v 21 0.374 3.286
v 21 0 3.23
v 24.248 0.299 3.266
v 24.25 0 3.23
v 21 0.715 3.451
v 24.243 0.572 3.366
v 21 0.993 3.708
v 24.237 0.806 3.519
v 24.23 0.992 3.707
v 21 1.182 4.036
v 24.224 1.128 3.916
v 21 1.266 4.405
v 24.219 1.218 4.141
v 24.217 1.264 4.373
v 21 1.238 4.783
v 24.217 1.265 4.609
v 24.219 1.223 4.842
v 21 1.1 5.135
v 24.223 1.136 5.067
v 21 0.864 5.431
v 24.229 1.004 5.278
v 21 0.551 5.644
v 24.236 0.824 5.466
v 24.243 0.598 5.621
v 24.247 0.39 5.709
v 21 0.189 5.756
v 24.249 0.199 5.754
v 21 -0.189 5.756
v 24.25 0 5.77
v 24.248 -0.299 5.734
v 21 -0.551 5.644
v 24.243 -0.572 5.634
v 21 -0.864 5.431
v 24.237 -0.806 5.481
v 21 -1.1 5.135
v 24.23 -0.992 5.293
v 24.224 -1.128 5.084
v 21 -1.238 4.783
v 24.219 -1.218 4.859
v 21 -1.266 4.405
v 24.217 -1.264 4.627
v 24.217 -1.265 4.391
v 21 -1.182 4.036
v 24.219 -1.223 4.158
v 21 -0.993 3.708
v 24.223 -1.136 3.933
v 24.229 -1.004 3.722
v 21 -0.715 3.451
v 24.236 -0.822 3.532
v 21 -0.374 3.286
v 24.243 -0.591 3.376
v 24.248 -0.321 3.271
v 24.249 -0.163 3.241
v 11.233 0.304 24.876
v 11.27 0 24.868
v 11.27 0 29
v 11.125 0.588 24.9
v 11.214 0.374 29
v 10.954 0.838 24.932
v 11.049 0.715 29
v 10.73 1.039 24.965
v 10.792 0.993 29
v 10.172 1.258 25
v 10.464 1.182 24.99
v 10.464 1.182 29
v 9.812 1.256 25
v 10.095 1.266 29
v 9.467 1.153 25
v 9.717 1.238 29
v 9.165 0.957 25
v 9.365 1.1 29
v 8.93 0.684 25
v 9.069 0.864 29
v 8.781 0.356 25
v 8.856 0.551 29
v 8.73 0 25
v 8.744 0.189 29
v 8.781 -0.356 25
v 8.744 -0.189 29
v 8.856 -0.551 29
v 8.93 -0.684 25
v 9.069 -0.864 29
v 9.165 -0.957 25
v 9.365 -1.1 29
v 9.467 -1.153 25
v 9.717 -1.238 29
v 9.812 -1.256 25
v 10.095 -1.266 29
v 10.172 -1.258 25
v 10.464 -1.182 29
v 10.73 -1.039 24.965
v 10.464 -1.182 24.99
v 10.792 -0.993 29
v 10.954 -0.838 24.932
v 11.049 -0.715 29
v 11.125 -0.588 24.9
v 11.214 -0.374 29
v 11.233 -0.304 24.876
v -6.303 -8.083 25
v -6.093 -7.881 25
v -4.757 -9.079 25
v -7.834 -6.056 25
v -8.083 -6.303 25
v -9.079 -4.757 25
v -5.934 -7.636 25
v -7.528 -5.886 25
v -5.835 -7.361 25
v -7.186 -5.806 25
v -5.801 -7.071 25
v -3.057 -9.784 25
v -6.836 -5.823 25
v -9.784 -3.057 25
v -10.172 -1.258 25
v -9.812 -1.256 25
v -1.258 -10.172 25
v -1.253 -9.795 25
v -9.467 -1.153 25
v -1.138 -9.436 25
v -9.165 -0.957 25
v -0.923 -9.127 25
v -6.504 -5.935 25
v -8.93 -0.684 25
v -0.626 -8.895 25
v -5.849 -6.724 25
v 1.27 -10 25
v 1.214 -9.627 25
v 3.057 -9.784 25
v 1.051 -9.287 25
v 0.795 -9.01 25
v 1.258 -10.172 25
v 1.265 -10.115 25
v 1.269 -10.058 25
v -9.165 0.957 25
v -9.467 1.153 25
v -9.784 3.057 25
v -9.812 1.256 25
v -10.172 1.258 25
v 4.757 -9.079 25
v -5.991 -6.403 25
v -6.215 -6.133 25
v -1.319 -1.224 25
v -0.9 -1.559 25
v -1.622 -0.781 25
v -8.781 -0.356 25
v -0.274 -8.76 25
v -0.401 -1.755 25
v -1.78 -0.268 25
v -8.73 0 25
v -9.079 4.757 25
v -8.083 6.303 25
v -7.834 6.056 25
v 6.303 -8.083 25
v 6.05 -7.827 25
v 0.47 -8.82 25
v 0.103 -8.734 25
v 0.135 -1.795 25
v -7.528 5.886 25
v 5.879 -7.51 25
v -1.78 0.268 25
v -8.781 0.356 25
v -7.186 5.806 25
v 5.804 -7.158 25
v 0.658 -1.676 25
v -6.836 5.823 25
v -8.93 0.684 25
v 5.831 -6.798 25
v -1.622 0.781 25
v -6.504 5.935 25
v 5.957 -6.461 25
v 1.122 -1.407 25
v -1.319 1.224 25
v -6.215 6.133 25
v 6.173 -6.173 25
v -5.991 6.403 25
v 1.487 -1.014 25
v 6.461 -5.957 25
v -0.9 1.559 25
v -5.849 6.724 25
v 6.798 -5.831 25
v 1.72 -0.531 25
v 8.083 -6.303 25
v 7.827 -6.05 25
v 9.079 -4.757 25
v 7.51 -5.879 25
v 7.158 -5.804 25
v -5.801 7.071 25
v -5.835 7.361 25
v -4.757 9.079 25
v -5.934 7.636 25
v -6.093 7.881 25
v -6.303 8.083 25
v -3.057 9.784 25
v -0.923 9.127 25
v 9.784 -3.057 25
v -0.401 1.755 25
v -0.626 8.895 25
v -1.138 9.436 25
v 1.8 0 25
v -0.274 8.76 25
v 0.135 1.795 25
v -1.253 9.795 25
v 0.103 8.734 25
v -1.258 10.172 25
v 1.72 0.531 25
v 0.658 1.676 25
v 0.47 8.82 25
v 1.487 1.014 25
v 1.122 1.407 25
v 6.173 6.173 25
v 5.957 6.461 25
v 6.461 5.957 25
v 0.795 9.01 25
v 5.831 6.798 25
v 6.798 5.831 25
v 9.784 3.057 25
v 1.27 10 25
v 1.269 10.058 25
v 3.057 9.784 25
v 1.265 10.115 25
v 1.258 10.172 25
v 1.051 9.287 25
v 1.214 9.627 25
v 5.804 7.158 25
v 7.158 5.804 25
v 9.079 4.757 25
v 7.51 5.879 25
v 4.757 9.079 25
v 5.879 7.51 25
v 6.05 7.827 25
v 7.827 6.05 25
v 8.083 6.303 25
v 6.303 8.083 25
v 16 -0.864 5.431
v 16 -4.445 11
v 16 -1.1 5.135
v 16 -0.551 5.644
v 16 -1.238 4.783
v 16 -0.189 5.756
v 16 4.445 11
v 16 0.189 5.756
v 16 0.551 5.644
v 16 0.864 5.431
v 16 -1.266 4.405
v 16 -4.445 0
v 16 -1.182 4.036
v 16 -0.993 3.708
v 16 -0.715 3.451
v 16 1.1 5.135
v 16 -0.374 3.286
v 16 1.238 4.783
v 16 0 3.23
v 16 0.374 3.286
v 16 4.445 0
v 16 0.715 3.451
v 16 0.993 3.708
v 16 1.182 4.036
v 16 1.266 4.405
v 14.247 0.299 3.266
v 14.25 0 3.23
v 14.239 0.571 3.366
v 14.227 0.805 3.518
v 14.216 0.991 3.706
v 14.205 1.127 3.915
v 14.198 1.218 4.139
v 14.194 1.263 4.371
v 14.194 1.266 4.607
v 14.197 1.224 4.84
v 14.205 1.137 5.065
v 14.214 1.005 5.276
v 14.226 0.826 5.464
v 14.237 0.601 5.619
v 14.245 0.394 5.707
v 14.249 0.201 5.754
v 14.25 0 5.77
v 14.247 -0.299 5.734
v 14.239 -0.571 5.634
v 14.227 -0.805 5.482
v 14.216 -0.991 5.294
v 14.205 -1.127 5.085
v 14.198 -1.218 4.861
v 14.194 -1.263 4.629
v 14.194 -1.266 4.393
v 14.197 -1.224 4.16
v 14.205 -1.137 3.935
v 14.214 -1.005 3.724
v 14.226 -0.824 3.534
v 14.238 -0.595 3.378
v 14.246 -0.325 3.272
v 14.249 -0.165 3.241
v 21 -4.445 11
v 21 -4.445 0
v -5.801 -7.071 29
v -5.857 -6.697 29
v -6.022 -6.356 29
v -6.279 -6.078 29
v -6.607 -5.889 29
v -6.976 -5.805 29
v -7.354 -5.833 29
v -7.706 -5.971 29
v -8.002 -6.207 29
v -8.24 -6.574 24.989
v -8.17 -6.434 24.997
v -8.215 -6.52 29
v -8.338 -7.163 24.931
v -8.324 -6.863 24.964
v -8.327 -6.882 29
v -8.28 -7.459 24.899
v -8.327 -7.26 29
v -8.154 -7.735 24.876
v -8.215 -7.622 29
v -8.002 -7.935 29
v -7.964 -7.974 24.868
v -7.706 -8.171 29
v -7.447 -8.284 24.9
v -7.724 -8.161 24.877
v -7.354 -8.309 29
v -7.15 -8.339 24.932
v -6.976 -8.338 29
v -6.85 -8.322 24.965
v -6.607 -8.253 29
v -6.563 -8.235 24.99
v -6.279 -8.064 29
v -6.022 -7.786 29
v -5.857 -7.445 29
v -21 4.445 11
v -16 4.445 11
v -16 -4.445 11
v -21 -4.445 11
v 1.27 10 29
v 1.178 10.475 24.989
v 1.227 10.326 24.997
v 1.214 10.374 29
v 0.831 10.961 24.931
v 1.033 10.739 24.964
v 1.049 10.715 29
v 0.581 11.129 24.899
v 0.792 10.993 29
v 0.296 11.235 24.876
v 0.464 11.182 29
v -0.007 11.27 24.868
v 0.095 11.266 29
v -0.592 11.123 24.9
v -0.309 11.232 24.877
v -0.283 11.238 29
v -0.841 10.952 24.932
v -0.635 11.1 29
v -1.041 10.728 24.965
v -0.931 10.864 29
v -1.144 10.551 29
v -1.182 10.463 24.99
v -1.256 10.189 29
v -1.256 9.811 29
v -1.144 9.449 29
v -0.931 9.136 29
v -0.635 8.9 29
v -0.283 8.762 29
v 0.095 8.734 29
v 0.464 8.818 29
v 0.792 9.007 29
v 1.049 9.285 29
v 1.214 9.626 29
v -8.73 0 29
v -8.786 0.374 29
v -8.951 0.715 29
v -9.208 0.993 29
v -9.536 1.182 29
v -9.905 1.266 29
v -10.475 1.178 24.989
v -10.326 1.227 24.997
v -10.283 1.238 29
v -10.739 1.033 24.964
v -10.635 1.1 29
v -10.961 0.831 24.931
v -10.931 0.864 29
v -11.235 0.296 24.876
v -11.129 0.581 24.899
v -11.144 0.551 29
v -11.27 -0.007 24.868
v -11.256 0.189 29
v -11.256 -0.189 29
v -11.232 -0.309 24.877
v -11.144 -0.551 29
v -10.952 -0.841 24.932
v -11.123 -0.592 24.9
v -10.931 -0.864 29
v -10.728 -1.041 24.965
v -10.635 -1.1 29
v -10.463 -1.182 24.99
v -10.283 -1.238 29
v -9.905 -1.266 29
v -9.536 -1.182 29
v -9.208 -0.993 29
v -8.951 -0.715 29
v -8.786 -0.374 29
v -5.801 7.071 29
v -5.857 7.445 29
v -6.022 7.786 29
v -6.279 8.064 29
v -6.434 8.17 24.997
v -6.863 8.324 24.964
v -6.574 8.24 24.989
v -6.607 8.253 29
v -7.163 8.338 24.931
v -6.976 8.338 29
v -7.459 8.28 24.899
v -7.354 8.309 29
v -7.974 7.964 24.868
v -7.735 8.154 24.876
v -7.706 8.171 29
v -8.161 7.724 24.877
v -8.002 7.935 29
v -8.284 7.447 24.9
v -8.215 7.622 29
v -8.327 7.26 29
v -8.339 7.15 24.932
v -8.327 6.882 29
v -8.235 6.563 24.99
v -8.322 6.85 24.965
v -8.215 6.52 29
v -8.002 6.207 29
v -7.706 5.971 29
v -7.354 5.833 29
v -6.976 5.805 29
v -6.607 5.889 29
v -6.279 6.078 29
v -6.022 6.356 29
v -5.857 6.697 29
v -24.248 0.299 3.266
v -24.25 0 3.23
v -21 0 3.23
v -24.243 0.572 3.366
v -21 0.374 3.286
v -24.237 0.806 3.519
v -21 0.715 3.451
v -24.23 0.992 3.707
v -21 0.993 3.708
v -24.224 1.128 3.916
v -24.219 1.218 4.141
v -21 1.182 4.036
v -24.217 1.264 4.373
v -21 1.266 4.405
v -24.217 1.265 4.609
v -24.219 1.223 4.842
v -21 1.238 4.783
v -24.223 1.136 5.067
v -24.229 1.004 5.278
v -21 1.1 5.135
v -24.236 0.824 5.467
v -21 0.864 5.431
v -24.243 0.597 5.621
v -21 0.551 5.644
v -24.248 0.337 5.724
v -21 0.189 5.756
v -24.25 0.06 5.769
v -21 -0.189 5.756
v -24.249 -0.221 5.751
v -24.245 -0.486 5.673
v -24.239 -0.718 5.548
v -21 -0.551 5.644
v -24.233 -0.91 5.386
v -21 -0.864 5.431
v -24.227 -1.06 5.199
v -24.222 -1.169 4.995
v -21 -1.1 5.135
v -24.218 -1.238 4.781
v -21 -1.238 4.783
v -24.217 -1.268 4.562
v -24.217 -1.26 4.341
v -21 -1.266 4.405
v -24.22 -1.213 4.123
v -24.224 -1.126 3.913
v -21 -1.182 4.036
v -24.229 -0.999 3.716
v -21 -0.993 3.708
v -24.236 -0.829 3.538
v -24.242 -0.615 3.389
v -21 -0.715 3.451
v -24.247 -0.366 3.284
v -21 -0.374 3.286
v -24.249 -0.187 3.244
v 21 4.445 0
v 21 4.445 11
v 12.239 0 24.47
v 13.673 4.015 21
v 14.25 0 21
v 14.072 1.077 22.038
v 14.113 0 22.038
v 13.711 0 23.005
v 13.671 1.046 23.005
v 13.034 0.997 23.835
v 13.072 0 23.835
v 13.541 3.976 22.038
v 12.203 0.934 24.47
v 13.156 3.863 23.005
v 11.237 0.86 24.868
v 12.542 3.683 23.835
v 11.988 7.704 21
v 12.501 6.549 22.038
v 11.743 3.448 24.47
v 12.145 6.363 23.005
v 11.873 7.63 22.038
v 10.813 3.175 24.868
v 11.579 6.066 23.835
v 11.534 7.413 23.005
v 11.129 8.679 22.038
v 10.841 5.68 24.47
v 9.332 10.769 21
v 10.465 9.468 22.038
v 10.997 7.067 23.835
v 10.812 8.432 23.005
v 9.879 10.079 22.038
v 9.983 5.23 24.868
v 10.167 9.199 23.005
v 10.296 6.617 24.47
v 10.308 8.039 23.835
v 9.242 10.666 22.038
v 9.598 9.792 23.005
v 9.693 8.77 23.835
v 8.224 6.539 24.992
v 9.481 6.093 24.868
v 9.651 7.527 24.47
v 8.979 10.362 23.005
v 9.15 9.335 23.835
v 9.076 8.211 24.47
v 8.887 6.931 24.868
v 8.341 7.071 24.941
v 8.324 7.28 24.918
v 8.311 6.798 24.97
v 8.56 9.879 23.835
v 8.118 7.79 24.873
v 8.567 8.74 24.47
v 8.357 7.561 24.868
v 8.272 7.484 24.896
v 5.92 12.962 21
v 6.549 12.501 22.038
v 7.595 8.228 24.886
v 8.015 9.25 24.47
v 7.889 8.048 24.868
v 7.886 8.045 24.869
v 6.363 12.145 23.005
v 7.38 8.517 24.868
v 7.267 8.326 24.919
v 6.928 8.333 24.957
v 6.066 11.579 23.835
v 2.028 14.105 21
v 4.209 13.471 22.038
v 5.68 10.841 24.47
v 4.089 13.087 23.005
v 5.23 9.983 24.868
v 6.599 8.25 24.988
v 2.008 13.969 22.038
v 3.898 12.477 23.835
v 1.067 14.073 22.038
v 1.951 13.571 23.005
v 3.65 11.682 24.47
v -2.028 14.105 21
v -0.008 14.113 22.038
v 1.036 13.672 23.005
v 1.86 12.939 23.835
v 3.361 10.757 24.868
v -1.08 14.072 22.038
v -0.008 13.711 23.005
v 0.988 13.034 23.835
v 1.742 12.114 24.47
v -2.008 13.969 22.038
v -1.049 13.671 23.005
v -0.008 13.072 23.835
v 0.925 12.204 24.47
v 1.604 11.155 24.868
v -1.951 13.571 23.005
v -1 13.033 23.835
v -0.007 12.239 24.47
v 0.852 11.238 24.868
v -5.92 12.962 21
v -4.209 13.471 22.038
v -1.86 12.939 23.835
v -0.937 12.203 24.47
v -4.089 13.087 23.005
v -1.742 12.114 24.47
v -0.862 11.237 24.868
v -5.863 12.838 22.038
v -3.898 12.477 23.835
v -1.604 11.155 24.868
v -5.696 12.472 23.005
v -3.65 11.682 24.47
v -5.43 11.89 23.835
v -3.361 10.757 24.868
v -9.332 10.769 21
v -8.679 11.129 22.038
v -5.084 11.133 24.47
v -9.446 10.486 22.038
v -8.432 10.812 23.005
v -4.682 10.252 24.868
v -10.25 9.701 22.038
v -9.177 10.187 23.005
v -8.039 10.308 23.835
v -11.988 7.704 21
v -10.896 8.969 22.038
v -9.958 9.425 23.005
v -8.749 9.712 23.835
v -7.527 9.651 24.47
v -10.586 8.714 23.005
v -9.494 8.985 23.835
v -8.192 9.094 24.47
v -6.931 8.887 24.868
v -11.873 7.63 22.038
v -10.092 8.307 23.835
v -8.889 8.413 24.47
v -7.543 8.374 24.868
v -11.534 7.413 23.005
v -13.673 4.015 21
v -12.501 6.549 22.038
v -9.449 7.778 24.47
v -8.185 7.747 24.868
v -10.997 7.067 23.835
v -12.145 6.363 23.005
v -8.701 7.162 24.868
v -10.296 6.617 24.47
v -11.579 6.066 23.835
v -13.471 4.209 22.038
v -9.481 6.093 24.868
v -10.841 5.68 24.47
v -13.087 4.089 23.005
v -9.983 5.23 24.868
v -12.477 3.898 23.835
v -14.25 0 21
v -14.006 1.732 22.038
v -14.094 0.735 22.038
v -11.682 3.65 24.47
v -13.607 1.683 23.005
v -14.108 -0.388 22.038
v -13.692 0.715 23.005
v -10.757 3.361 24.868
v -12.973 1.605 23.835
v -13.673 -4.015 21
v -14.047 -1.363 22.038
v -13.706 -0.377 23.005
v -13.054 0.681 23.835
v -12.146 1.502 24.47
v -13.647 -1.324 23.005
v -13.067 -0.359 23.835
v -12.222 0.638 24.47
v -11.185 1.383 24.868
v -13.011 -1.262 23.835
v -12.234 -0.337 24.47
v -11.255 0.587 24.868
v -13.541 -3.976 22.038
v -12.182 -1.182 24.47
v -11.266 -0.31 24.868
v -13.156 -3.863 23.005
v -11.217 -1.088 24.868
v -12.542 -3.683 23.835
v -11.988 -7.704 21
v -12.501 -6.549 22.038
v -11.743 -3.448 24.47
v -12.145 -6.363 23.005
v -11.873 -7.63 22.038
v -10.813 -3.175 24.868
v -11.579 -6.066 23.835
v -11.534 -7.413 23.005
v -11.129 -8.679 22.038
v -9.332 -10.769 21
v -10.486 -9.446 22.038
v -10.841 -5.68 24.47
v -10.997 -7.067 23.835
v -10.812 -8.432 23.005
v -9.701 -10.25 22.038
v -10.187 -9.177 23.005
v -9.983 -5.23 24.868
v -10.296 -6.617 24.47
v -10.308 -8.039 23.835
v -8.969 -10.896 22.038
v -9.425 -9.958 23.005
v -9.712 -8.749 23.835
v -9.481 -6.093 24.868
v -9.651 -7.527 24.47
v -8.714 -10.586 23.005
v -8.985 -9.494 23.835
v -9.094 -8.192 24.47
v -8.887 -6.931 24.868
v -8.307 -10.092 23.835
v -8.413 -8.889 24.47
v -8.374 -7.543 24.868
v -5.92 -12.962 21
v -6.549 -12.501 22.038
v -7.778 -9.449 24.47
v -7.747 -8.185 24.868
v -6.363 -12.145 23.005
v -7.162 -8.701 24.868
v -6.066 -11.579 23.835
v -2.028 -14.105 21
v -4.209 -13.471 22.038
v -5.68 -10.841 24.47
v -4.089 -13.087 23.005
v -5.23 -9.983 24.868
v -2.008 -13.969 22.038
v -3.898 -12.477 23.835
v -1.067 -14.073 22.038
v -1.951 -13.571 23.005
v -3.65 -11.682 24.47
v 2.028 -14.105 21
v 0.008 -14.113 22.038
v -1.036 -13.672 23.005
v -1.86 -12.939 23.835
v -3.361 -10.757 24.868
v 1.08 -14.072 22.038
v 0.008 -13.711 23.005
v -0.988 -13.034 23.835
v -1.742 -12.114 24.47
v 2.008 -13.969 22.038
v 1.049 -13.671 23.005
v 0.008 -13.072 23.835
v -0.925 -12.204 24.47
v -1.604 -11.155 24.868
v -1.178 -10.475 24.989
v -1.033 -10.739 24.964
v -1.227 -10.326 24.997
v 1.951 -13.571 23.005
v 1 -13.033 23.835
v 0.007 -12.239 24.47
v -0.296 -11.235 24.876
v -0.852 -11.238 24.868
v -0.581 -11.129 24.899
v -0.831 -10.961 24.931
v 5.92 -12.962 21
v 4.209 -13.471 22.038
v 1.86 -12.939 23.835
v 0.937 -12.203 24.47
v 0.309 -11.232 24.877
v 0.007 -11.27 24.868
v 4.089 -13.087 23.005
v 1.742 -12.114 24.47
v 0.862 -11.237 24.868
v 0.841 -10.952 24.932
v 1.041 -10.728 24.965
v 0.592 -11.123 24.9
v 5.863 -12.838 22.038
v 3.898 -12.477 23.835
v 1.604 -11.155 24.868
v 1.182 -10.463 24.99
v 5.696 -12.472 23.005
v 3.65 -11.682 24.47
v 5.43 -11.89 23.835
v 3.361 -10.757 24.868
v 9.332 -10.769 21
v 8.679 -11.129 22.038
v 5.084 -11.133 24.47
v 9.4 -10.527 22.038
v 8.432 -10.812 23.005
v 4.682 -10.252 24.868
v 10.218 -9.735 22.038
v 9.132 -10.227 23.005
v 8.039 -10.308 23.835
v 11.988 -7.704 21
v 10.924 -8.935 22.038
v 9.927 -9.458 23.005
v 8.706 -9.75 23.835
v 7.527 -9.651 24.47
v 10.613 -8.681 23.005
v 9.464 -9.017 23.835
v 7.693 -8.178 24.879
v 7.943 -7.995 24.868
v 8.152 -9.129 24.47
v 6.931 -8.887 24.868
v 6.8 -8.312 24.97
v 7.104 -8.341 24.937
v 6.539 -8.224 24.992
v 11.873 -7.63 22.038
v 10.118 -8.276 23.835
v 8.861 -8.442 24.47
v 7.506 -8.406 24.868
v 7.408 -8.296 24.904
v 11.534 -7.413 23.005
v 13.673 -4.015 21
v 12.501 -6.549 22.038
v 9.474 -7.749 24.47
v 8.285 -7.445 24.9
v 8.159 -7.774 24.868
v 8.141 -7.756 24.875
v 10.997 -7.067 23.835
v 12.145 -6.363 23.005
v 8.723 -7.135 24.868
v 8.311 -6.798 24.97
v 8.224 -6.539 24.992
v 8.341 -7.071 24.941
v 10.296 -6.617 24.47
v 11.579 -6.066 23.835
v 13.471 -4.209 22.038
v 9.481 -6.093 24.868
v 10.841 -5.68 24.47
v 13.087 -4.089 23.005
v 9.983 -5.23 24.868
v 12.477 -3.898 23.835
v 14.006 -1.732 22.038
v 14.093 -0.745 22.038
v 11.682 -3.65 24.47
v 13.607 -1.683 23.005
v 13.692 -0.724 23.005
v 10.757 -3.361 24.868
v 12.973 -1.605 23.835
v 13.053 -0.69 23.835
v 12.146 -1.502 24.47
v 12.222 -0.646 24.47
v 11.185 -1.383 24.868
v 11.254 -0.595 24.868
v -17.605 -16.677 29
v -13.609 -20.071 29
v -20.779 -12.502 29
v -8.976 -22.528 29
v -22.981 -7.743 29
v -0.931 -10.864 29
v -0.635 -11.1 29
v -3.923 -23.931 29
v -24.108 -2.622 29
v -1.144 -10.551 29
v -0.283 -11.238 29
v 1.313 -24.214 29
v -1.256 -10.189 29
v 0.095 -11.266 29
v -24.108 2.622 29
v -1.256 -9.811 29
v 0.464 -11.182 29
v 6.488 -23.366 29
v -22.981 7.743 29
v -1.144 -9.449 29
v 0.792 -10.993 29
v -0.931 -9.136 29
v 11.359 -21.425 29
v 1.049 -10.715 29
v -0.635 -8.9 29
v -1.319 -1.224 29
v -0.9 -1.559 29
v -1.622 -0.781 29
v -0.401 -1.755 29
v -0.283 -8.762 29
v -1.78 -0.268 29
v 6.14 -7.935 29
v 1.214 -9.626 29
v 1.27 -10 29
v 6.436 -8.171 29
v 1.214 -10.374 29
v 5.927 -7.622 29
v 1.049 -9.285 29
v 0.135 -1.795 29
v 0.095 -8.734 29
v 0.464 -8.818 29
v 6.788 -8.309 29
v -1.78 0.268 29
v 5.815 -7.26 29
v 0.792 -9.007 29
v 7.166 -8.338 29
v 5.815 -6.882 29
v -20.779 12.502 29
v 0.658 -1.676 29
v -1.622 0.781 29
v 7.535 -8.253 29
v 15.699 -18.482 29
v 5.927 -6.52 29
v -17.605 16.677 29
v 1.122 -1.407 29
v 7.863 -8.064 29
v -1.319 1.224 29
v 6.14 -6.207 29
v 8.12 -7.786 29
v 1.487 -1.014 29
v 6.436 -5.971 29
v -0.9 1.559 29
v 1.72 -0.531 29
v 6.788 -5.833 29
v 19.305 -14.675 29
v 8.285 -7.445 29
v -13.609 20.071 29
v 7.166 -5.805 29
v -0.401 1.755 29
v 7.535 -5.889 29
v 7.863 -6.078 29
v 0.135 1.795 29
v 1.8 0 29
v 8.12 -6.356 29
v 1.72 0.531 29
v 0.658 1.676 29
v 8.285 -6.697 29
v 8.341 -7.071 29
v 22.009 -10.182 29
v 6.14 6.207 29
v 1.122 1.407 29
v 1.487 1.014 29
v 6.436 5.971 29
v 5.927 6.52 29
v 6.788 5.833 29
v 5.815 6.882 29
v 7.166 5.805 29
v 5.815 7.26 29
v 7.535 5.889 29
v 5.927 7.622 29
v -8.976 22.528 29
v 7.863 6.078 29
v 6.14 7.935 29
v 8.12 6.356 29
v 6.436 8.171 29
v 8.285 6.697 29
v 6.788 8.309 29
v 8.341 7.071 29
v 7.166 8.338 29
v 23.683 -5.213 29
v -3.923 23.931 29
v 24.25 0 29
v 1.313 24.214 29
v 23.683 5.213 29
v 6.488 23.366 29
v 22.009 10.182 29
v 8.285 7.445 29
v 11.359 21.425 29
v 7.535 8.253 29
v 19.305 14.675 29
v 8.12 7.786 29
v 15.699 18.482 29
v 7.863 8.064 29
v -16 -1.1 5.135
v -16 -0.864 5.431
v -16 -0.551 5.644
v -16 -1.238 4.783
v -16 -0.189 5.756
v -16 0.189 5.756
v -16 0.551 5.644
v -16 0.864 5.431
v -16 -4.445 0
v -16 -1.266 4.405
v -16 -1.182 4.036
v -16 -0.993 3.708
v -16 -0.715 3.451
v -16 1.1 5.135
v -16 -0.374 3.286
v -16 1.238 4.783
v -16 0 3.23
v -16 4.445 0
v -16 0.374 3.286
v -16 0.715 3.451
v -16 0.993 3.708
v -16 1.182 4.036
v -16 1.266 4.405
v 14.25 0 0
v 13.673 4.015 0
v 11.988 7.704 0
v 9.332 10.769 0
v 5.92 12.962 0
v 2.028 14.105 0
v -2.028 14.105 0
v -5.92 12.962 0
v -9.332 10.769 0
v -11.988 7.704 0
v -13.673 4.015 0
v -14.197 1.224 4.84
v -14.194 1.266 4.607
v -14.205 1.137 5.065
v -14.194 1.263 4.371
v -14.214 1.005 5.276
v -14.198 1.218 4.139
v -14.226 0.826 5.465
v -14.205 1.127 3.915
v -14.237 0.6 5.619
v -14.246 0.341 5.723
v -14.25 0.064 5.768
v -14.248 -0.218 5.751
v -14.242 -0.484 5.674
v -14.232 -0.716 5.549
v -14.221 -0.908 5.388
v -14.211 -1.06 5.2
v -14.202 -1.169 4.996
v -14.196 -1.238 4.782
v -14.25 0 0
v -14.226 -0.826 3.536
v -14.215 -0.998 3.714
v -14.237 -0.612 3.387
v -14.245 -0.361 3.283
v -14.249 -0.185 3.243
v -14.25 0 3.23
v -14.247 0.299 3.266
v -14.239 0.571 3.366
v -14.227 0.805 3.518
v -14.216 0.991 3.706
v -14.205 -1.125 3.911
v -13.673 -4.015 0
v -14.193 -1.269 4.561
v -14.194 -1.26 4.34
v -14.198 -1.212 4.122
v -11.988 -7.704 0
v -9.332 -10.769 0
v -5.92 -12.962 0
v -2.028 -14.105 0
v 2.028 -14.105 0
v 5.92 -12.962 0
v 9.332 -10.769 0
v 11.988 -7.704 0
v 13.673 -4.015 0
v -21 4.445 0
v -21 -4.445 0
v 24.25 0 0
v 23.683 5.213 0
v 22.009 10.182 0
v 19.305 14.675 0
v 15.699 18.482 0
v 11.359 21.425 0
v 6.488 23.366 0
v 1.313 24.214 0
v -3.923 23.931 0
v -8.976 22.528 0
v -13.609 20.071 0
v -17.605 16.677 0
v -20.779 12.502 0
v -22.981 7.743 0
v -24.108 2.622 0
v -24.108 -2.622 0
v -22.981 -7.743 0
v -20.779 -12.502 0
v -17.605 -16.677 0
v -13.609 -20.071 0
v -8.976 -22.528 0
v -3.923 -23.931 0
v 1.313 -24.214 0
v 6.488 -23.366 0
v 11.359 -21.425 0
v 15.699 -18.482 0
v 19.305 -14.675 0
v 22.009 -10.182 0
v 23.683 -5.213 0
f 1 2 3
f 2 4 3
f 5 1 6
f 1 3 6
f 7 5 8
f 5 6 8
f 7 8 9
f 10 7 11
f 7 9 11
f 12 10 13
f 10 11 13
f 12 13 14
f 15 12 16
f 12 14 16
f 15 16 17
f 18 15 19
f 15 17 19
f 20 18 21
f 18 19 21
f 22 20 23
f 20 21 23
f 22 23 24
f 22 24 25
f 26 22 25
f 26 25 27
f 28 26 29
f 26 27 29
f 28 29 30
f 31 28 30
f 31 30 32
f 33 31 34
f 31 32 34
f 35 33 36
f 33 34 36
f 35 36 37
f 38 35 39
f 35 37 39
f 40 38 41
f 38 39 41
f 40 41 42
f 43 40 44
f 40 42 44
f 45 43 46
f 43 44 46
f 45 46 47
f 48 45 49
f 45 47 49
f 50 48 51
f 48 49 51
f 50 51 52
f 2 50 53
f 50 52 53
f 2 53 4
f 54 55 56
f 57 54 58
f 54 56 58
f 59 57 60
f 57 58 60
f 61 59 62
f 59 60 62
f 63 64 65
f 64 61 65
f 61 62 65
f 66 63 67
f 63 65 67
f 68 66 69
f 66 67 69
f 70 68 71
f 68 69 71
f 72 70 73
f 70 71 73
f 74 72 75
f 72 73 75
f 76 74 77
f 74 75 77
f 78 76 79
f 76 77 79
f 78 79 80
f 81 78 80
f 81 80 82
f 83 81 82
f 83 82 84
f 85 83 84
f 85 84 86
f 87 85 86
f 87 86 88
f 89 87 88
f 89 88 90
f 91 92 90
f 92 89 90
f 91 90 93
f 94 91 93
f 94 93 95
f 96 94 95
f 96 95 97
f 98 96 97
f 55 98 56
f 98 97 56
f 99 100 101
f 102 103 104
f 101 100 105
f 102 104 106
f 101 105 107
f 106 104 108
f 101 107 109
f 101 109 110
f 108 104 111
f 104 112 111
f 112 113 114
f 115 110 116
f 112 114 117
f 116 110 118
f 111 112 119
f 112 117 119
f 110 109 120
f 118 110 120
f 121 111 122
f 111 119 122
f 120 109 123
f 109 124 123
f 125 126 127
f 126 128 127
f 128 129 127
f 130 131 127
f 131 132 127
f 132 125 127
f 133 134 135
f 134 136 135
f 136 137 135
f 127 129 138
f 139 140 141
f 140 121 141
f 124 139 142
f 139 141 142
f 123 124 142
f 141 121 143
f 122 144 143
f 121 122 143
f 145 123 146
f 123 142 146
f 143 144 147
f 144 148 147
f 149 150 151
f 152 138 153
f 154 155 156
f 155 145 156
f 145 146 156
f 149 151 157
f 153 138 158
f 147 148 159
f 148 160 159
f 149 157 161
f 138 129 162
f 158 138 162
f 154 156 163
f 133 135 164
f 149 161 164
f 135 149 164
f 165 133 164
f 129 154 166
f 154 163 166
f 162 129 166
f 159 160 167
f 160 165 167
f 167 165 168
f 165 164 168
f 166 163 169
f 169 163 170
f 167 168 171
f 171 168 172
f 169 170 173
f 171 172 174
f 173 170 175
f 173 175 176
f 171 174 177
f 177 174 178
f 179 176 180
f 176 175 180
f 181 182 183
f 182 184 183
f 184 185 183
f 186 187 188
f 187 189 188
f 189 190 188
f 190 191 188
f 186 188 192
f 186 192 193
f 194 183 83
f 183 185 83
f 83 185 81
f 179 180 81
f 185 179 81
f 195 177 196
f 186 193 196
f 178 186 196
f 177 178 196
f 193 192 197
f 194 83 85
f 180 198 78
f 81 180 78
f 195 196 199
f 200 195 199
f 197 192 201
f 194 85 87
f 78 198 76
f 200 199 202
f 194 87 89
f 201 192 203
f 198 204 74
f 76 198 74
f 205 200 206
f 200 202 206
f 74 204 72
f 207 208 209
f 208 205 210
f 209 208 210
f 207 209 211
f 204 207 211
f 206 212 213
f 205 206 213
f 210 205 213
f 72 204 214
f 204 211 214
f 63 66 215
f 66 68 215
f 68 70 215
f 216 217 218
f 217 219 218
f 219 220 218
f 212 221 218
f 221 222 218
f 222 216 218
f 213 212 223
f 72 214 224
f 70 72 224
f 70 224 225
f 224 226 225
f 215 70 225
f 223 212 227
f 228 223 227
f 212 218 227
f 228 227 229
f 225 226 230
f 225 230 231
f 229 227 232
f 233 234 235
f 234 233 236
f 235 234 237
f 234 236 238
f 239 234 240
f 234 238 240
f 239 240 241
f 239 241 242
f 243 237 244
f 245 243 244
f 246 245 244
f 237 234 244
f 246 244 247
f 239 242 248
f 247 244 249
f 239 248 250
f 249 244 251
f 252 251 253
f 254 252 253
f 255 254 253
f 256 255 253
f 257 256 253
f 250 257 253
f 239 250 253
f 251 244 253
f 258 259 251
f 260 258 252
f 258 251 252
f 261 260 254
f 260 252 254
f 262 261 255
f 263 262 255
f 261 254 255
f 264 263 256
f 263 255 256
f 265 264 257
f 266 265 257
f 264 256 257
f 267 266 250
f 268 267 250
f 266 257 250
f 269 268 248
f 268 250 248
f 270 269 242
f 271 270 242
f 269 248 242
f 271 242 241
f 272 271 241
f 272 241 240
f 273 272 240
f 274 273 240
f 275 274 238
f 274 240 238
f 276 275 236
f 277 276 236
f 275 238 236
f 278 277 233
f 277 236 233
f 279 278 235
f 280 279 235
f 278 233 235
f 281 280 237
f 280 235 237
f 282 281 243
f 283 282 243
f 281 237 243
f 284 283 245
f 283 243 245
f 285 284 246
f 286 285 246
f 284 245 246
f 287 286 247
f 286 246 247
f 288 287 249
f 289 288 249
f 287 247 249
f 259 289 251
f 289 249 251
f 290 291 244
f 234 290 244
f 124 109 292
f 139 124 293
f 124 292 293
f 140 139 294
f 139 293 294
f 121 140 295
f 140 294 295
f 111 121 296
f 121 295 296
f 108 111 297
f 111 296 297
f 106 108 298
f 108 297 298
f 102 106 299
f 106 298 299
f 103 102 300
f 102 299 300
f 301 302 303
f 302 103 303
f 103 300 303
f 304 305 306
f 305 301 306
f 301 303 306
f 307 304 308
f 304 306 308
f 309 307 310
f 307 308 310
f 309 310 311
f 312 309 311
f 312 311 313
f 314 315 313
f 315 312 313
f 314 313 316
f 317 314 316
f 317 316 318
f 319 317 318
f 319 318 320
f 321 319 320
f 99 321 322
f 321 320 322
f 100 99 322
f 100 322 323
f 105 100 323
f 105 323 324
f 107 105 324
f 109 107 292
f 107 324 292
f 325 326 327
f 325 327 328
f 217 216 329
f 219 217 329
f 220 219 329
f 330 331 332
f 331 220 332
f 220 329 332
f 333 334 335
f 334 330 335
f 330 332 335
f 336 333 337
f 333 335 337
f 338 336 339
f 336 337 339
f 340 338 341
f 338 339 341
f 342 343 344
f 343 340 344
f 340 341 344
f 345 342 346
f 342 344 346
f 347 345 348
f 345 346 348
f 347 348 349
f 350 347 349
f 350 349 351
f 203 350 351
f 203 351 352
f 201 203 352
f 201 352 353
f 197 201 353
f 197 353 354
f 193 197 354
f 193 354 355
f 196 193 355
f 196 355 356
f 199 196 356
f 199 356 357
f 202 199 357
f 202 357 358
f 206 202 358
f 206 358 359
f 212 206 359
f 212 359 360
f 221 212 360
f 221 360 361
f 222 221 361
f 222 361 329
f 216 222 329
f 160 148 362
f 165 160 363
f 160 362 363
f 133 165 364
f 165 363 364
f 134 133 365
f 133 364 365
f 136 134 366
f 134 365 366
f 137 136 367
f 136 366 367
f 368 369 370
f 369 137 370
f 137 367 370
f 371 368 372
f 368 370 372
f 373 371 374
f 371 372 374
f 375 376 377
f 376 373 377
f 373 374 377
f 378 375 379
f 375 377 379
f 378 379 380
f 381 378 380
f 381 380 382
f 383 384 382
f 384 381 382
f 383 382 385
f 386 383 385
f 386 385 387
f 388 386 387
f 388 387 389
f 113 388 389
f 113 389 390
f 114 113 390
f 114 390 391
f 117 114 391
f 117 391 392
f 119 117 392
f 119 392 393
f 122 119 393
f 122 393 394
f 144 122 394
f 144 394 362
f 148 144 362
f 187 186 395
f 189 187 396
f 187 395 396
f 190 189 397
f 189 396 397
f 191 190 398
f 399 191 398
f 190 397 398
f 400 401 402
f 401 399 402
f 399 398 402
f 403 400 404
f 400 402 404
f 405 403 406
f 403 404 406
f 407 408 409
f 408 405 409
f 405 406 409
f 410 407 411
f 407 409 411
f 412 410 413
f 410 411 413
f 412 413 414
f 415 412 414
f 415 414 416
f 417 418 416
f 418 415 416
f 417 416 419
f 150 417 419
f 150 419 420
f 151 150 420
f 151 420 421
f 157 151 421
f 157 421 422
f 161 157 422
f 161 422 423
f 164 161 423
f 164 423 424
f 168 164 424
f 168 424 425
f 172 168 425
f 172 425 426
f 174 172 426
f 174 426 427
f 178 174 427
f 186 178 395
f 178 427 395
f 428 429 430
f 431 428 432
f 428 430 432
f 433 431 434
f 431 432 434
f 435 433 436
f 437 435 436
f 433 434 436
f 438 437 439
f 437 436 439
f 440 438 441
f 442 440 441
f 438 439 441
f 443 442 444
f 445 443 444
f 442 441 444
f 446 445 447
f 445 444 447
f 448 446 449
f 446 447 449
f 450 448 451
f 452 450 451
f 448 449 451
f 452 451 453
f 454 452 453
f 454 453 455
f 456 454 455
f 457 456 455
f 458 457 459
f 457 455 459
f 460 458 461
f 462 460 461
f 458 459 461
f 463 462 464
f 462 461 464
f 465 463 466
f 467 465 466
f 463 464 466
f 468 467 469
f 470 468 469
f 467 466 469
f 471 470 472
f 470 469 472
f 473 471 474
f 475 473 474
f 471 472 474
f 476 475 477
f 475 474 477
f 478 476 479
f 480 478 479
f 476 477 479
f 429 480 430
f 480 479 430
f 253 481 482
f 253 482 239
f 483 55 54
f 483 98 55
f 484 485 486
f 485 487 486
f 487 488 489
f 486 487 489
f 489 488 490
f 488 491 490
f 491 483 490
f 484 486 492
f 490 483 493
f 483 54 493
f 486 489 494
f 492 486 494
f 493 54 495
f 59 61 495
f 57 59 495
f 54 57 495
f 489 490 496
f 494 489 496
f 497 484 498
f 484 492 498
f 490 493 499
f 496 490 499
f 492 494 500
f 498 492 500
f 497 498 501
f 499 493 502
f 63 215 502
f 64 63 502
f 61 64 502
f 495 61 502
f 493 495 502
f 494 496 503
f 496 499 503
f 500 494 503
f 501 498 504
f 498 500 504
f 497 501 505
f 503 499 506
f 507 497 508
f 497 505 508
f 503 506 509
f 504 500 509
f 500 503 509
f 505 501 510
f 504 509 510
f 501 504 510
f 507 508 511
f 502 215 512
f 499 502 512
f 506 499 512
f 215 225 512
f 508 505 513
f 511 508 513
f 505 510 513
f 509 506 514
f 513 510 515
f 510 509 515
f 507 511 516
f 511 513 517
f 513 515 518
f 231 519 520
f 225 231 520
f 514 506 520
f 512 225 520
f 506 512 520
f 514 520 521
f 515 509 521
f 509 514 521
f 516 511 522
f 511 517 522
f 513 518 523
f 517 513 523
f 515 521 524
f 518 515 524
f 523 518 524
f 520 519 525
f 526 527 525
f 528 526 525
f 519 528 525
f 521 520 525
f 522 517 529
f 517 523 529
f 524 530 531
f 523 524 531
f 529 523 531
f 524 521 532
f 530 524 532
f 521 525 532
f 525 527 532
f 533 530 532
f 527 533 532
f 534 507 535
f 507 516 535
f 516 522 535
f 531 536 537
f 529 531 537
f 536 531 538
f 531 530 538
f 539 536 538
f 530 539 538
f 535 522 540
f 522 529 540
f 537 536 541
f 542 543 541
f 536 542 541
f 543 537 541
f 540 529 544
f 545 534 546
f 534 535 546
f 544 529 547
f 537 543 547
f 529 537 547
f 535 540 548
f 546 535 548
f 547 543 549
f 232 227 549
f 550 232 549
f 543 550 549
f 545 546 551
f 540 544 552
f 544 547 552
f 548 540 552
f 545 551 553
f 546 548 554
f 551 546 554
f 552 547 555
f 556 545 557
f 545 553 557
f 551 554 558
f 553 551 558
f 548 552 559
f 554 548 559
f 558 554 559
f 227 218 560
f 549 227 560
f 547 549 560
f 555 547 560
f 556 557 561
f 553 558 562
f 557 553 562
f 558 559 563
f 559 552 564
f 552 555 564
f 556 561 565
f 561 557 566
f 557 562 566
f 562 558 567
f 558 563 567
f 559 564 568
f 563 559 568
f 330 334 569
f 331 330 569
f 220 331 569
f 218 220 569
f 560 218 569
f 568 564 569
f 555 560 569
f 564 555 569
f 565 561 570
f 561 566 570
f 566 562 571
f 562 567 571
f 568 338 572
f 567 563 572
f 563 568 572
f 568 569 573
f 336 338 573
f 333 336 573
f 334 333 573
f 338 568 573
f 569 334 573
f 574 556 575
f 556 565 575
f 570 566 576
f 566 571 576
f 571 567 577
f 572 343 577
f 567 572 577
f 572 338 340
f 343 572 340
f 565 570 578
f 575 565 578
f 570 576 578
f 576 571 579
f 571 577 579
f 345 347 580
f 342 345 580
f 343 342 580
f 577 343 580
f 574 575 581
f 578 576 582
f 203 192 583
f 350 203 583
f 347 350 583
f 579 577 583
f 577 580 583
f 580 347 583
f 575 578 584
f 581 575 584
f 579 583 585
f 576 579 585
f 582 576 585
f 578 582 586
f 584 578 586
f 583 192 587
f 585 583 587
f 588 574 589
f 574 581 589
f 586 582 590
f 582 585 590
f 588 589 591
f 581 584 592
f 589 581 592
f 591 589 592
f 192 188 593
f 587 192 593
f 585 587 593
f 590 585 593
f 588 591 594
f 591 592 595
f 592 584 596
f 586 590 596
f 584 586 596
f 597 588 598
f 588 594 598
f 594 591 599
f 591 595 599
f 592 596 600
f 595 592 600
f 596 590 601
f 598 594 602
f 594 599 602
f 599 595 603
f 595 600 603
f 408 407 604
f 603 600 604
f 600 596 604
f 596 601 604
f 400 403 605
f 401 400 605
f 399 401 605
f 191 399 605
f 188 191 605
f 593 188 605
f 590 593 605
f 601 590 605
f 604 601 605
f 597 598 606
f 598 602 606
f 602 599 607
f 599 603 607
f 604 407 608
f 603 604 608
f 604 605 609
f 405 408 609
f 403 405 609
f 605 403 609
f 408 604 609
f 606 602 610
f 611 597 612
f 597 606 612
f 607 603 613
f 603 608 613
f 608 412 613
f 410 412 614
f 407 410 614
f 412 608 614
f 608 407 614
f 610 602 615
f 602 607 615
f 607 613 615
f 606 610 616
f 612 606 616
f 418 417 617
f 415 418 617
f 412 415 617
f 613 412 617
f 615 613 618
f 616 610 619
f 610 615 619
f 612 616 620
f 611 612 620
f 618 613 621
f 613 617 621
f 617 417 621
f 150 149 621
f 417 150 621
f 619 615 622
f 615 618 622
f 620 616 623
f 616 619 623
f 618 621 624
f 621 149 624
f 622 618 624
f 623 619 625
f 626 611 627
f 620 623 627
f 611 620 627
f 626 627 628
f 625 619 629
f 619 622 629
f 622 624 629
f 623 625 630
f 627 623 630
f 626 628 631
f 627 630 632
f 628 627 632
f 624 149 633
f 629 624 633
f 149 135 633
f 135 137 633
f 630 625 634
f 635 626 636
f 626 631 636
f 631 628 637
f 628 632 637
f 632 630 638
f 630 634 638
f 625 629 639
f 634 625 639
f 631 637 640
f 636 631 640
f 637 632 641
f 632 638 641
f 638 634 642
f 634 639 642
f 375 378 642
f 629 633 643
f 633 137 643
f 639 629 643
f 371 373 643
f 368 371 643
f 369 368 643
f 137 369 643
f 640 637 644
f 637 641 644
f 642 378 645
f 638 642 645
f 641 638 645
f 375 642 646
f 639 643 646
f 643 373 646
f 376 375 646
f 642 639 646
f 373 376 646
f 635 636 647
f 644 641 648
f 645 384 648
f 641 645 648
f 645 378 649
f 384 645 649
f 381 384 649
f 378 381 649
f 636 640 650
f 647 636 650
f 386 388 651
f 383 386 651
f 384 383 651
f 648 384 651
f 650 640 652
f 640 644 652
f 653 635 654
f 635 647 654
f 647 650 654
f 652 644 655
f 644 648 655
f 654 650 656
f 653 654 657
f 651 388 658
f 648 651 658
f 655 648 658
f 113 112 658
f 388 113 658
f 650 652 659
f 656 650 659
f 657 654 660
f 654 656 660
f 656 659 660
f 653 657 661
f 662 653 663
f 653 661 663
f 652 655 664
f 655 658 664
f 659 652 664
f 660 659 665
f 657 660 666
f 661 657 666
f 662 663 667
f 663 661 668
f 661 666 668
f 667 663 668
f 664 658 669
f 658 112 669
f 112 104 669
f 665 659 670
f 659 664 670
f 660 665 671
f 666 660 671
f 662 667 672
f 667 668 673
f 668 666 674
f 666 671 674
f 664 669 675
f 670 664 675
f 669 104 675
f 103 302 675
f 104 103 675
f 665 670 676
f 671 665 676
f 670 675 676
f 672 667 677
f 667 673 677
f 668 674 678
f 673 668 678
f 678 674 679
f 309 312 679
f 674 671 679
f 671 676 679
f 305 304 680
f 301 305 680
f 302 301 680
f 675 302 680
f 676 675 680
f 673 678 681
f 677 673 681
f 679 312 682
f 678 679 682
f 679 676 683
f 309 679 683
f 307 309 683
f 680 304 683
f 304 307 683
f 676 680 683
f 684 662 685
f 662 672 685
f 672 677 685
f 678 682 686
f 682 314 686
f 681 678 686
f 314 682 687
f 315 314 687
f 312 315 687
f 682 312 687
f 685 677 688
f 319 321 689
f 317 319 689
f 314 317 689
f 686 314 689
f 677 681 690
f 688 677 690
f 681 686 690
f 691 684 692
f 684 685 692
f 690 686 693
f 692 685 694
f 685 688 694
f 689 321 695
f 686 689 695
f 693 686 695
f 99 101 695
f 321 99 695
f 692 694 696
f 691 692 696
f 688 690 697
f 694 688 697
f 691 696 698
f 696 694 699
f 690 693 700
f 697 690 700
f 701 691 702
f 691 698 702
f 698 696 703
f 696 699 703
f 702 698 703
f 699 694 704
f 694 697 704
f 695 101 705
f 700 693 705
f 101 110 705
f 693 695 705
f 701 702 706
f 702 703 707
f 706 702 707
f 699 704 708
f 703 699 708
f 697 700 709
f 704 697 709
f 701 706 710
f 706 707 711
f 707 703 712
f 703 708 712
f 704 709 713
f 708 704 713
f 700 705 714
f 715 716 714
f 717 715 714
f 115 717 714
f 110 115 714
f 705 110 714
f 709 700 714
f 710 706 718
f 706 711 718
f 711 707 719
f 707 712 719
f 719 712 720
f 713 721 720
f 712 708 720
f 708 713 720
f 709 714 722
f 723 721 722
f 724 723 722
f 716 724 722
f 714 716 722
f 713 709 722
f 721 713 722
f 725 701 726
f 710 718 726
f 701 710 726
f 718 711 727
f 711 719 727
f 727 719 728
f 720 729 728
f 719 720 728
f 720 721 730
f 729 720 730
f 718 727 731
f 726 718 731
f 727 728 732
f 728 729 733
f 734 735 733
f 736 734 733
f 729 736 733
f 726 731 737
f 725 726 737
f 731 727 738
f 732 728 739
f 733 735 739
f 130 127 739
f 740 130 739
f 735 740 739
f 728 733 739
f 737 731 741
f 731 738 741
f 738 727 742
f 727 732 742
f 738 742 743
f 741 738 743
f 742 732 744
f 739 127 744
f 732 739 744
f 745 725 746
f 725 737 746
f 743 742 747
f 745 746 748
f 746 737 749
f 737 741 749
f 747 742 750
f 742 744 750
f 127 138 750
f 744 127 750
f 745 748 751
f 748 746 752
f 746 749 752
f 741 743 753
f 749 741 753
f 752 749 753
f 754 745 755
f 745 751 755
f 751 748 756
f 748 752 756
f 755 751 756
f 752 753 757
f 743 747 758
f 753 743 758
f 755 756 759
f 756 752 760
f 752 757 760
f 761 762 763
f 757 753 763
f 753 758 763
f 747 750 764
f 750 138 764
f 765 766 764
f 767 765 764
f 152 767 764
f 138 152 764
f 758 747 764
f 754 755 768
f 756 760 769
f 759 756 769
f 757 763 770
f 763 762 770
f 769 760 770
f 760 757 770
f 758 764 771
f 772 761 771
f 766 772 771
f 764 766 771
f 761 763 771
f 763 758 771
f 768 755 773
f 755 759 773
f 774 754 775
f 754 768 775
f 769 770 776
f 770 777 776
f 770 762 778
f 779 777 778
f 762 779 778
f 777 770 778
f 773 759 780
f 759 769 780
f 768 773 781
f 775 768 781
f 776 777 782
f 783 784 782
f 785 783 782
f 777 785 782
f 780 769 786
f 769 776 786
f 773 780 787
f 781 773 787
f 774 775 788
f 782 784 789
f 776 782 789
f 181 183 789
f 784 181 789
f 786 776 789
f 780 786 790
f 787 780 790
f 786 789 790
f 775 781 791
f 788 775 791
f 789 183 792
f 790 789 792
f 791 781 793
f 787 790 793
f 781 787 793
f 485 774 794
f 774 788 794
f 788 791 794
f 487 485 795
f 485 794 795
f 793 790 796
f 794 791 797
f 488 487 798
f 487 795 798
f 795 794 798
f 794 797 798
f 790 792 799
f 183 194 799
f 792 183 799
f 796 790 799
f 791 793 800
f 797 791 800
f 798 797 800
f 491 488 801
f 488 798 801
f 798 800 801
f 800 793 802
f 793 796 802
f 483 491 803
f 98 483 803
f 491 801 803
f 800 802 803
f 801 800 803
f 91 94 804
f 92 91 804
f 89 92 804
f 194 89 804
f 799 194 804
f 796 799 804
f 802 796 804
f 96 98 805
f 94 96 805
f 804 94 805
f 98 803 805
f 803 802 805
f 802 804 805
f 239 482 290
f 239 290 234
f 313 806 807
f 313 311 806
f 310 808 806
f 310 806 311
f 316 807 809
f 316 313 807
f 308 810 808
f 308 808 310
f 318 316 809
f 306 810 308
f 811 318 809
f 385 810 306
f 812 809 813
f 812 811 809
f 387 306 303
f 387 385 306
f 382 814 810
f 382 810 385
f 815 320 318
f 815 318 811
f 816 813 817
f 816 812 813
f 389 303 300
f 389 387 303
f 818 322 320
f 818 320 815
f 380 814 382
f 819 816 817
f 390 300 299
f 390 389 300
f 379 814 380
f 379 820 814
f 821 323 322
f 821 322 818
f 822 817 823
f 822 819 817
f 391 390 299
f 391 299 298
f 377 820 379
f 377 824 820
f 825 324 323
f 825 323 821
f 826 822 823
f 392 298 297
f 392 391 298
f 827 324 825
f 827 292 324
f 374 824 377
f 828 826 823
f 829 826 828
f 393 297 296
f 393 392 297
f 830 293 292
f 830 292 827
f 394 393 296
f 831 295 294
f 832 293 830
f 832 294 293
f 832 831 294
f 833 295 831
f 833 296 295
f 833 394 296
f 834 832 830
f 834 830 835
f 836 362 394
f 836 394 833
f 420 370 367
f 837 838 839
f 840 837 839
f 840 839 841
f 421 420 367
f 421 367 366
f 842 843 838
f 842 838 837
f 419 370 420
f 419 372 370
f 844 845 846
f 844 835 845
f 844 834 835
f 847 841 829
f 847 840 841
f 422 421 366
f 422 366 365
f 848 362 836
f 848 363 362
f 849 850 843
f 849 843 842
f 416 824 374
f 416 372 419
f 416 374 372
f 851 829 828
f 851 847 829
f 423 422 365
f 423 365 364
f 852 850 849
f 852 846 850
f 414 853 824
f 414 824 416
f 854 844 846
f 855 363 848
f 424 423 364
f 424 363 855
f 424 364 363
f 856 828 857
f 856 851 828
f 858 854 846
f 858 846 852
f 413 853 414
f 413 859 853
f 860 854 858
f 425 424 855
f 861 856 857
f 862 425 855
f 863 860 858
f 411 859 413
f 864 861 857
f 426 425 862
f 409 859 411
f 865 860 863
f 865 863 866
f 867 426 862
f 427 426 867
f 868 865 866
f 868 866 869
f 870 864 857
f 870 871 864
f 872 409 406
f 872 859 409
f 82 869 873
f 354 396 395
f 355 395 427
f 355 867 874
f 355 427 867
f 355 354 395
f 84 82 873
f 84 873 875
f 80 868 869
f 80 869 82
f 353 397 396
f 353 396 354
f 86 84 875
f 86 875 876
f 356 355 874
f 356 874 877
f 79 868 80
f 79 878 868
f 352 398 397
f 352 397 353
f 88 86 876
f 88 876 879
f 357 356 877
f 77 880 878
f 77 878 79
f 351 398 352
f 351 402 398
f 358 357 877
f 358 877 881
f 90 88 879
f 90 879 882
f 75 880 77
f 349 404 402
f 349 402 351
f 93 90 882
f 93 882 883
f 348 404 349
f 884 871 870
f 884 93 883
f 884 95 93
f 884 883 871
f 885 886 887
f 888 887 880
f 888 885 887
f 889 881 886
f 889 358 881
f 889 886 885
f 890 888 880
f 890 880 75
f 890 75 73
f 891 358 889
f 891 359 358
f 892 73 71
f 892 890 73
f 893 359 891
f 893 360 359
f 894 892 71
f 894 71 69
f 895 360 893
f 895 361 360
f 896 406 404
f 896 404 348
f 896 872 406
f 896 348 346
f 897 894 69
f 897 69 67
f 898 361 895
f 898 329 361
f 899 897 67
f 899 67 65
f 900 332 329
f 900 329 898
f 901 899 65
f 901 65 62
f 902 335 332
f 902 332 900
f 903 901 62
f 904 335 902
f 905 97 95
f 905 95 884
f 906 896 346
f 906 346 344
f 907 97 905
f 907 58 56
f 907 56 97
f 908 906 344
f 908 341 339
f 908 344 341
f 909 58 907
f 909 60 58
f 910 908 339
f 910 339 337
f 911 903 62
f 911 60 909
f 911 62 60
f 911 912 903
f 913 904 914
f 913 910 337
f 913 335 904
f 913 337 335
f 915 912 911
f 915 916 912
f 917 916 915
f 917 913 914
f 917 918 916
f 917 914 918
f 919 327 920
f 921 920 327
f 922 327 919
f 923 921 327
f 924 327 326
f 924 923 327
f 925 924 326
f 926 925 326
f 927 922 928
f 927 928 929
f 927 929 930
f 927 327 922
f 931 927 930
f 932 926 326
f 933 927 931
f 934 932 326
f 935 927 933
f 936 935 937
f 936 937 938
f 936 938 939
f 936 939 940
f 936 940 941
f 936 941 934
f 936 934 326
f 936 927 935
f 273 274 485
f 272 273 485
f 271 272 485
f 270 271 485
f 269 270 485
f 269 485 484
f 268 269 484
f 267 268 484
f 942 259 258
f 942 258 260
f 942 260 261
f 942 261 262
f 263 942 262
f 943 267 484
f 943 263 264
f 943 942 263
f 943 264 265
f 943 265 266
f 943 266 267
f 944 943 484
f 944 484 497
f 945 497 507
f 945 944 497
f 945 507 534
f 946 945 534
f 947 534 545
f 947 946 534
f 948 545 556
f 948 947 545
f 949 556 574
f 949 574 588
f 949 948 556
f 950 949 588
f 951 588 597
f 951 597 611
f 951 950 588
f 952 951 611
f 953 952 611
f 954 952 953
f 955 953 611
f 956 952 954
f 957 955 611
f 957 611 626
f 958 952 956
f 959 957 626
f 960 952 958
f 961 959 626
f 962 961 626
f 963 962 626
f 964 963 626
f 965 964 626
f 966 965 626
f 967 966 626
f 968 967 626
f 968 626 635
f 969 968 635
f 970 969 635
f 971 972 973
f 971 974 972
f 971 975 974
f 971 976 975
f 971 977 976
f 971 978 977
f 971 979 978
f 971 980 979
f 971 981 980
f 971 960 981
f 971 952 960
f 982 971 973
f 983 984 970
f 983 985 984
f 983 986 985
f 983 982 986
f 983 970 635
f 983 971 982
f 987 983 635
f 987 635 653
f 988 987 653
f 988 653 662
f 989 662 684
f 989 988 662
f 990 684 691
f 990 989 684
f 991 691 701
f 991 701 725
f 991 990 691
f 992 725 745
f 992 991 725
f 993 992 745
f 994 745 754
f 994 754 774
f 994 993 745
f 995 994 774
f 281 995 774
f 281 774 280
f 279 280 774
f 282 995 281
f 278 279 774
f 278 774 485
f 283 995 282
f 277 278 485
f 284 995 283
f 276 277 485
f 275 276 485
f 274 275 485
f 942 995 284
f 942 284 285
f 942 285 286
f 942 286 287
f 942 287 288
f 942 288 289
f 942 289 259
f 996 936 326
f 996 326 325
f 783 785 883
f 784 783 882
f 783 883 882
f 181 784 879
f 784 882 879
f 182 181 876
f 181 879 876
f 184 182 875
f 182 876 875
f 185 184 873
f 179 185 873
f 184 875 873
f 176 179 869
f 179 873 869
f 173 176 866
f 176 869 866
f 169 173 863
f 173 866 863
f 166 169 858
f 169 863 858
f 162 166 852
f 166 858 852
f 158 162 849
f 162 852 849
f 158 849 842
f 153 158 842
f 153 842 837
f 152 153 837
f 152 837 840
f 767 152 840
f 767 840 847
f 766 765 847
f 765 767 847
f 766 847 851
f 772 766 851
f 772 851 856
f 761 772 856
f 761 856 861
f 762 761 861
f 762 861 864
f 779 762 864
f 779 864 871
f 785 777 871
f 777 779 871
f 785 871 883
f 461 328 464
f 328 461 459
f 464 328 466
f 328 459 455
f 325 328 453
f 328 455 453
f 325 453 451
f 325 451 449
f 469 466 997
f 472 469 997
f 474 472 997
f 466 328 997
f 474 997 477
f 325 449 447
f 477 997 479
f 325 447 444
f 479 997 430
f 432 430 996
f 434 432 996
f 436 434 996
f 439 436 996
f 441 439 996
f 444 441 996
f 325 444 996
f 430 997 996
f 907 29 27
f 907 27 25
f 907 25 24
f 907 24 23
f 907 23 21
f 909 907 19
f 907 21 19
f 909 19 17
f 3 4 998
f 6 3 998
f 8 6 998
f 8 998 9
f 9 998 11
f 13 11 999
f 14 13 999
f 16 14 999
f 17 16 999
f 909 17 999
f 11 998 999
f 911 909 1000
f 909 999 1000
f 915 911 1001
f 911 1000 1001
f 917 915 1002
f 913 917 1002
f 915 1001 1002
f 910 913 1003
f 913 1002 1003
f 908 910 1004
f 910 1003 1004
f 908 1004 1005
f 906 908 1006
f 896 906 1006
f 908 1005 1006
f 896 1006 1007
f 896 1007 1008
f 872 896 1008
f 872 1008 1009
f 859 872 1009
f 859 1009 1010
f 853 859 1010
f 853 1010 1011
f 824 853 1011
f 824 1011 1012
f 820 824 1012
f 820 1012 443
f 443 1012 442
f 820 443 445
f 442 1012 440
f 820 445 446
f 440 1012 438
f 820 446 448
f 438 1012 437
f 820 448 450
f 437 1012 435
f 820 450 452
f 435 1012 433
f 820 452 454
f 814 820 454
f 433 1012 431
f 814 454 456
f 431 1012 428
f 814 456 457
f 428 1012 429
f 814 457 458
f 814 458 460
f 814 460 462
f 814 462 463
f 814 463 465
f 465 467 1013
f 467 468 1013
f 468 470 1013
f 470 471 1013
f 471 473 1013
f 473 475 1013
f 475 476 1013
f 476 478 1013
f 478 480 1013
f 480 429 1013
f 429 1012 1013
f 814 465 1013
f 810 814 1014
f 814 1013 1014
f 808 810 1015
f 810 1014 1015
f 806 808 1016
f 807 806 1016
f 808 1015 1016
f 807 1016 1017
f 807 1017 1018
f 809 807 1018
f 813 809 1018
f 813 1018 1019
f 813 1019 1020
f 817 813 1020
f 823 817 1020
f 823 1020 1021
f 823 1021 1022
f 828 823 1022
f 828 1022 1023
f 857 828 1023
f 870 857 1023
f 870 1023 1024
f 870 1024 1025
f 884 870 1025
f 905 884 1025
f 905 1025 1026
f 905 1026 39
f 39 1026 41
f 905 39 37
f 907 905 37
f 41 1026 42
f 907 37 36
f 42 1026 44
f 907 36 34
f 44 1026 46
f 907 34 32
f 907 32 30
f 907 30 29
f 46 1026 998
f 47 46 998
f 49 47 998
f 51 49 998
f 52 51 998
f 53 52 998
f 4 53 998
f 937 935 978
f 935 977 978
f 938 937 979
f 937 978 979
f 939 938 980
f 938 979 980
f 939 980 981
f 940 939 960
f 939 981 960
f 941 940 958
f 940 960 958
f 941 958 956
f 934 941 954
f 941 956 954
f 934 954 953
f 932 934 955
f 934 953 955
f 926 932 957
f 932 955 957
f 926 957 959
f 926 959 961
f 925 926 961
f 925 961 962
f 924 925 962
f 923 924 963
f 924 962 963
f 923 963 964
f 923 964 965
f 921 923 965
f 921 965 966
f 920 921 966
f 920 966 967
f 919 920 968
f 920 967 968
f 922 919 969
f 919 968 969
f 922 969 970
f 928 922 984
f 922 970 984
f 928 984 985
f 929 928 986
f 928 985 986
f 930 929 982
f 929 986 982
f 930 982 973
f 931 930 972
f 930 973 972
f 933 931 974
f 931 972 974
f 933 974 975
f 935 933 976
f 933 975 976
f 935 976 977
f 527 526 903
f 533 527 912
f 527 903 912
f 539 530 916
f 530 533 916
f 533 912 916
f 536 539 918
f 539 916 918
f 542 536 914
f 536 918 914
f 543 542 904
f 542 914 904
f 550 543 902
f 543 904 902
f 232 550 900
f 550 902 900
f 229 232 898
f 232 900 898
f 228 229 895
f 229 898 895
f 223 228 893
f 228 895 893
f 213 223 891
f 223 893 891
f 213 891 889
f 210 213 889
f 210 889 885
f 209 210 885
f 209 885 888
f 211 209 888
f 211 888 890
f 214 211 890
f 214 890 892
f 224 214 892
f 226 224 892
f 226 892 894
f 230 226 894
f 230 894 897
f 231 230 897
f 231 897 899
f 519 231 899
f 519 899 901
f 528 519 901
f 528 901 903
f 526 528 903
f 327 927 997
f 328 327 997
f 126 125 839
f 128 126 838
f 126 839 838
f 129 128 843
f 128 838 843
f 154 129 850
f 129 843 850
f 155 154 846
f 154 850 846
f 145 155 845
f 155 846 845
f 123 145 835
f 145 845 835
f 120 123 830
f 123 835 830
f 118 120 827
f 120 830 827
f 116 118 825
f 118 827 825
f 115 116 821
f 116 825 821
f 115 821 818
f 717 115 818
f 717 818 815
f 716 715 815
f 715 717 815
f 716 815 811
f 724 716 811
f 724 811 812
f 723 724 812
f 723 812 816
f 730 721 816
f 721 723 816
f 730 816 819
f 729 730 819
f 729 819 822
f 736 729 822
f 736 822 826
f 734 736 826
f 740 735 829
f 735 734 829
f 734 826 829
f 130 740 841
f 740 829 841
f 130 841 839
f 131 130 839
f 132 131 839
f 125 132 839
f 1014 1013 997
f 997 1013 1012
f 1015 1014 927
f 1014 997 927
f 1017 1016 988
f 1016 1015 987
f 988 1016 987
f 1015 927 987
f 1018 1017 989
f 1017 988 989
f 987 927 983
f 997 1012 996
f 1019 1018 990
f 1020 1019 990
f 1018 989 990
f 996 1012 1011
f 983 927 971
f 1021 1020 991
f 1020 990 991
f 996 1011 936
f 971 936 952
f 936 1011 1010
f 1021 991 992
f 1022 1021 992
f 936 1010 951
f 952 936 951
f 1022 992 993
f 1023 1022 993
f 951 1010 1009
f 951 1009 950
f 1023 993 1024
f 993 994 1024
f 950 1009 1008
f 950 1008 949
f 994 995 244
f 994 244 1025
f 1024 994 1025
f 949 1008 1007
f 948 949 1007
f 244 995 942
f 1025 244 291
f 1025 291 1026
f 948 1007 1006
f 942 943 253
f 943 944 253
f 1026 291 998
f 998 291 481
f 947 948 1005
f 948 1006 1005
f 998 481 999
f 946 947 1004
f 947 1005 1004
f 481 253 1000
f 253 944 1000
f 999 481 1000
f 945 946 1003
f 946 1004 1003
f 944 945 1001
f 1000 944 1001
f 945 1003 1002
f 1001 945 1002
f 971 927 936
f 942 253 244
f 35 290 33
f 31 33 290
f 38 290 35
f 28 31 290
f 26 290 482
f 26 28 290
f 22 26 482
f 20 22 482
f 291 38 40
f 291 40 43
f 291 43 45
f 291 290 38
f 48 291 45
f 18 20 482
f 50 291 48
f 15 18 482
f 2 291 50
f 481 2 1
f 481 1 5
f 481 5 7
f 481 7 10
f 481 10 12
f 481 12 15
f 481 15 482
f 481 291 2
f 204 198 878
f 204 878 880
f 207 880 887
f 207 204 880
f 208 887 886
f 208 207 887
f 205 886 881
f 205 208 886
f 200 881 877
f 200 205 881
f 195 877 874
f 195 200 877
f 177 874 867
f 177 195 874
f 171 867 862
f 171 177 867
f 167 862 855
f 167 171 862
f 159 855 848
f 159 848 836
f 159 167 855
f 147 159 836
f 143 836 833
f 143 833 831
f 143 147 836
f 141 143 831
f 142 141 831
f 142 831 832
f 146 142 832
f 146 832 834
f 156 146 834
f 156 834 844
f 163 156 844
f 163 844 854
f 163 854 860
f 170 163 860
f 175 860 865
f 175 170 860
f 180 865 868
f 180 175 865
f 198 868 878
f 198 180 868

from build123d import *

# Parameters (mm, degrees)
SKETCH1_R           = 24.25
SKETCH1_R_2         = 14.25
BOSS_EXTRUDE1_DEPTH = 25
SKETCH2_R           = 24.25
SKETCH2_R_2         = 1.8
BOSS_EXTRUDE2_DEPTH = 4
SKETCH3_W           = 5
SKETCH3_H           = 8.89
CUT_EXTRUDE1_DEPTH  = 11
SKETCH4_R           = 1.27
CUT_EXTRUDE2_DEPTH  = 39
FILLET1_R           = 4
SKETCH5_R           = 1.27
CUT_EXTRUDE3_DEPTH  = 78


with BuildPart() as part:
    # Sketch1 → Boss-Extrude1 (new body)
    with BuildSketch(Plane.XY):
        Circle(SKETCH1_R)
        Circle(SKETCH1_R_2, mode=Mode.SUBTRACT)
    extrude(amount=BOSS_EXTRUDE1_DEPTH)

    # Sketch2 → Boss-Extrude2 (add)
    with BuildSketch(Plane.XY.offset(25)):
        Circle(SKETCH2_R)
        Circle(SKETCH2_R_2, mode=Mode.SUBTRACT)
    extrude(amount=BOSS_EXTRUDE2_DEPTH)

    # Sketch3 → Cut-Extrude1 (cut)
    with BuildSketch(Plane(origin=(0, 0, 0), x_dir=(-1, 0, 0), z_dir=(0, 0, -1))):
        with Locations((-18.5, 0)):
            Rectangle(SKETCH3_W, SKETCH3_H)
        with Locations((18.5, 0)):
            Rectangle(SKETCH3_W, SKETCH3_H)
    extrude(amount=-CUT_EXTRUDE1_DEPTH, mode=Mode.SUBTRACT)

    # Sketch4 → Cut-Extrude2 (cut, symmetric)
    with BuildSketch(Plane(origin=(0, 0, 0), x_dir=(0, 0, -1), z_dir=(1, 0, 0))):
        with Locations((-4.5, 0)):
            Circle(SKETCH4_R)
    extrude(amount=CUT_EXTRUDE2_DEPTH, both=True, mode=Mode.SUBTRACT)

    # Fillet1
    fillet1_edges = [part.edges().sort_by_distance(p)[0] for p in [
        (-14.25, 0, 25),
    ]]
    fillet(fillet1_edges, radius=FILLET1_R)

    # Sketch5 → Cut-Extrude3 (cut)
    with BuildSketch(Plane.XY.offset(29)):
        with Locations((0, 10)):
            Circle(SKETCH5_R)
        with Locations((7.071067812, 7.071067812)):
            Circle(SKETCH5_R)
        with Locations((10, 0)):
            Circle(SKETCH5_R)
        with Locations((7.071067812, -7.071067812)):
            Circle(SKETCH5_R)
        with Locations((0, -10)):
            Circle(SKETCH5_R)
        with Locations((-7.071067812, -7.071067812)):
            Circle(SKETCH5_R)
        with Locations((-10, 0)):
            Circle(SKETCH5_R)
        with Locations((-7.071067812, 7.071067812)):
            Circle(SKETCH5_R)
    extrude(amount=-CUT_EXTRUDE3_DEPTH, mode=Mode.SUBTRACT)


solid = part.part
